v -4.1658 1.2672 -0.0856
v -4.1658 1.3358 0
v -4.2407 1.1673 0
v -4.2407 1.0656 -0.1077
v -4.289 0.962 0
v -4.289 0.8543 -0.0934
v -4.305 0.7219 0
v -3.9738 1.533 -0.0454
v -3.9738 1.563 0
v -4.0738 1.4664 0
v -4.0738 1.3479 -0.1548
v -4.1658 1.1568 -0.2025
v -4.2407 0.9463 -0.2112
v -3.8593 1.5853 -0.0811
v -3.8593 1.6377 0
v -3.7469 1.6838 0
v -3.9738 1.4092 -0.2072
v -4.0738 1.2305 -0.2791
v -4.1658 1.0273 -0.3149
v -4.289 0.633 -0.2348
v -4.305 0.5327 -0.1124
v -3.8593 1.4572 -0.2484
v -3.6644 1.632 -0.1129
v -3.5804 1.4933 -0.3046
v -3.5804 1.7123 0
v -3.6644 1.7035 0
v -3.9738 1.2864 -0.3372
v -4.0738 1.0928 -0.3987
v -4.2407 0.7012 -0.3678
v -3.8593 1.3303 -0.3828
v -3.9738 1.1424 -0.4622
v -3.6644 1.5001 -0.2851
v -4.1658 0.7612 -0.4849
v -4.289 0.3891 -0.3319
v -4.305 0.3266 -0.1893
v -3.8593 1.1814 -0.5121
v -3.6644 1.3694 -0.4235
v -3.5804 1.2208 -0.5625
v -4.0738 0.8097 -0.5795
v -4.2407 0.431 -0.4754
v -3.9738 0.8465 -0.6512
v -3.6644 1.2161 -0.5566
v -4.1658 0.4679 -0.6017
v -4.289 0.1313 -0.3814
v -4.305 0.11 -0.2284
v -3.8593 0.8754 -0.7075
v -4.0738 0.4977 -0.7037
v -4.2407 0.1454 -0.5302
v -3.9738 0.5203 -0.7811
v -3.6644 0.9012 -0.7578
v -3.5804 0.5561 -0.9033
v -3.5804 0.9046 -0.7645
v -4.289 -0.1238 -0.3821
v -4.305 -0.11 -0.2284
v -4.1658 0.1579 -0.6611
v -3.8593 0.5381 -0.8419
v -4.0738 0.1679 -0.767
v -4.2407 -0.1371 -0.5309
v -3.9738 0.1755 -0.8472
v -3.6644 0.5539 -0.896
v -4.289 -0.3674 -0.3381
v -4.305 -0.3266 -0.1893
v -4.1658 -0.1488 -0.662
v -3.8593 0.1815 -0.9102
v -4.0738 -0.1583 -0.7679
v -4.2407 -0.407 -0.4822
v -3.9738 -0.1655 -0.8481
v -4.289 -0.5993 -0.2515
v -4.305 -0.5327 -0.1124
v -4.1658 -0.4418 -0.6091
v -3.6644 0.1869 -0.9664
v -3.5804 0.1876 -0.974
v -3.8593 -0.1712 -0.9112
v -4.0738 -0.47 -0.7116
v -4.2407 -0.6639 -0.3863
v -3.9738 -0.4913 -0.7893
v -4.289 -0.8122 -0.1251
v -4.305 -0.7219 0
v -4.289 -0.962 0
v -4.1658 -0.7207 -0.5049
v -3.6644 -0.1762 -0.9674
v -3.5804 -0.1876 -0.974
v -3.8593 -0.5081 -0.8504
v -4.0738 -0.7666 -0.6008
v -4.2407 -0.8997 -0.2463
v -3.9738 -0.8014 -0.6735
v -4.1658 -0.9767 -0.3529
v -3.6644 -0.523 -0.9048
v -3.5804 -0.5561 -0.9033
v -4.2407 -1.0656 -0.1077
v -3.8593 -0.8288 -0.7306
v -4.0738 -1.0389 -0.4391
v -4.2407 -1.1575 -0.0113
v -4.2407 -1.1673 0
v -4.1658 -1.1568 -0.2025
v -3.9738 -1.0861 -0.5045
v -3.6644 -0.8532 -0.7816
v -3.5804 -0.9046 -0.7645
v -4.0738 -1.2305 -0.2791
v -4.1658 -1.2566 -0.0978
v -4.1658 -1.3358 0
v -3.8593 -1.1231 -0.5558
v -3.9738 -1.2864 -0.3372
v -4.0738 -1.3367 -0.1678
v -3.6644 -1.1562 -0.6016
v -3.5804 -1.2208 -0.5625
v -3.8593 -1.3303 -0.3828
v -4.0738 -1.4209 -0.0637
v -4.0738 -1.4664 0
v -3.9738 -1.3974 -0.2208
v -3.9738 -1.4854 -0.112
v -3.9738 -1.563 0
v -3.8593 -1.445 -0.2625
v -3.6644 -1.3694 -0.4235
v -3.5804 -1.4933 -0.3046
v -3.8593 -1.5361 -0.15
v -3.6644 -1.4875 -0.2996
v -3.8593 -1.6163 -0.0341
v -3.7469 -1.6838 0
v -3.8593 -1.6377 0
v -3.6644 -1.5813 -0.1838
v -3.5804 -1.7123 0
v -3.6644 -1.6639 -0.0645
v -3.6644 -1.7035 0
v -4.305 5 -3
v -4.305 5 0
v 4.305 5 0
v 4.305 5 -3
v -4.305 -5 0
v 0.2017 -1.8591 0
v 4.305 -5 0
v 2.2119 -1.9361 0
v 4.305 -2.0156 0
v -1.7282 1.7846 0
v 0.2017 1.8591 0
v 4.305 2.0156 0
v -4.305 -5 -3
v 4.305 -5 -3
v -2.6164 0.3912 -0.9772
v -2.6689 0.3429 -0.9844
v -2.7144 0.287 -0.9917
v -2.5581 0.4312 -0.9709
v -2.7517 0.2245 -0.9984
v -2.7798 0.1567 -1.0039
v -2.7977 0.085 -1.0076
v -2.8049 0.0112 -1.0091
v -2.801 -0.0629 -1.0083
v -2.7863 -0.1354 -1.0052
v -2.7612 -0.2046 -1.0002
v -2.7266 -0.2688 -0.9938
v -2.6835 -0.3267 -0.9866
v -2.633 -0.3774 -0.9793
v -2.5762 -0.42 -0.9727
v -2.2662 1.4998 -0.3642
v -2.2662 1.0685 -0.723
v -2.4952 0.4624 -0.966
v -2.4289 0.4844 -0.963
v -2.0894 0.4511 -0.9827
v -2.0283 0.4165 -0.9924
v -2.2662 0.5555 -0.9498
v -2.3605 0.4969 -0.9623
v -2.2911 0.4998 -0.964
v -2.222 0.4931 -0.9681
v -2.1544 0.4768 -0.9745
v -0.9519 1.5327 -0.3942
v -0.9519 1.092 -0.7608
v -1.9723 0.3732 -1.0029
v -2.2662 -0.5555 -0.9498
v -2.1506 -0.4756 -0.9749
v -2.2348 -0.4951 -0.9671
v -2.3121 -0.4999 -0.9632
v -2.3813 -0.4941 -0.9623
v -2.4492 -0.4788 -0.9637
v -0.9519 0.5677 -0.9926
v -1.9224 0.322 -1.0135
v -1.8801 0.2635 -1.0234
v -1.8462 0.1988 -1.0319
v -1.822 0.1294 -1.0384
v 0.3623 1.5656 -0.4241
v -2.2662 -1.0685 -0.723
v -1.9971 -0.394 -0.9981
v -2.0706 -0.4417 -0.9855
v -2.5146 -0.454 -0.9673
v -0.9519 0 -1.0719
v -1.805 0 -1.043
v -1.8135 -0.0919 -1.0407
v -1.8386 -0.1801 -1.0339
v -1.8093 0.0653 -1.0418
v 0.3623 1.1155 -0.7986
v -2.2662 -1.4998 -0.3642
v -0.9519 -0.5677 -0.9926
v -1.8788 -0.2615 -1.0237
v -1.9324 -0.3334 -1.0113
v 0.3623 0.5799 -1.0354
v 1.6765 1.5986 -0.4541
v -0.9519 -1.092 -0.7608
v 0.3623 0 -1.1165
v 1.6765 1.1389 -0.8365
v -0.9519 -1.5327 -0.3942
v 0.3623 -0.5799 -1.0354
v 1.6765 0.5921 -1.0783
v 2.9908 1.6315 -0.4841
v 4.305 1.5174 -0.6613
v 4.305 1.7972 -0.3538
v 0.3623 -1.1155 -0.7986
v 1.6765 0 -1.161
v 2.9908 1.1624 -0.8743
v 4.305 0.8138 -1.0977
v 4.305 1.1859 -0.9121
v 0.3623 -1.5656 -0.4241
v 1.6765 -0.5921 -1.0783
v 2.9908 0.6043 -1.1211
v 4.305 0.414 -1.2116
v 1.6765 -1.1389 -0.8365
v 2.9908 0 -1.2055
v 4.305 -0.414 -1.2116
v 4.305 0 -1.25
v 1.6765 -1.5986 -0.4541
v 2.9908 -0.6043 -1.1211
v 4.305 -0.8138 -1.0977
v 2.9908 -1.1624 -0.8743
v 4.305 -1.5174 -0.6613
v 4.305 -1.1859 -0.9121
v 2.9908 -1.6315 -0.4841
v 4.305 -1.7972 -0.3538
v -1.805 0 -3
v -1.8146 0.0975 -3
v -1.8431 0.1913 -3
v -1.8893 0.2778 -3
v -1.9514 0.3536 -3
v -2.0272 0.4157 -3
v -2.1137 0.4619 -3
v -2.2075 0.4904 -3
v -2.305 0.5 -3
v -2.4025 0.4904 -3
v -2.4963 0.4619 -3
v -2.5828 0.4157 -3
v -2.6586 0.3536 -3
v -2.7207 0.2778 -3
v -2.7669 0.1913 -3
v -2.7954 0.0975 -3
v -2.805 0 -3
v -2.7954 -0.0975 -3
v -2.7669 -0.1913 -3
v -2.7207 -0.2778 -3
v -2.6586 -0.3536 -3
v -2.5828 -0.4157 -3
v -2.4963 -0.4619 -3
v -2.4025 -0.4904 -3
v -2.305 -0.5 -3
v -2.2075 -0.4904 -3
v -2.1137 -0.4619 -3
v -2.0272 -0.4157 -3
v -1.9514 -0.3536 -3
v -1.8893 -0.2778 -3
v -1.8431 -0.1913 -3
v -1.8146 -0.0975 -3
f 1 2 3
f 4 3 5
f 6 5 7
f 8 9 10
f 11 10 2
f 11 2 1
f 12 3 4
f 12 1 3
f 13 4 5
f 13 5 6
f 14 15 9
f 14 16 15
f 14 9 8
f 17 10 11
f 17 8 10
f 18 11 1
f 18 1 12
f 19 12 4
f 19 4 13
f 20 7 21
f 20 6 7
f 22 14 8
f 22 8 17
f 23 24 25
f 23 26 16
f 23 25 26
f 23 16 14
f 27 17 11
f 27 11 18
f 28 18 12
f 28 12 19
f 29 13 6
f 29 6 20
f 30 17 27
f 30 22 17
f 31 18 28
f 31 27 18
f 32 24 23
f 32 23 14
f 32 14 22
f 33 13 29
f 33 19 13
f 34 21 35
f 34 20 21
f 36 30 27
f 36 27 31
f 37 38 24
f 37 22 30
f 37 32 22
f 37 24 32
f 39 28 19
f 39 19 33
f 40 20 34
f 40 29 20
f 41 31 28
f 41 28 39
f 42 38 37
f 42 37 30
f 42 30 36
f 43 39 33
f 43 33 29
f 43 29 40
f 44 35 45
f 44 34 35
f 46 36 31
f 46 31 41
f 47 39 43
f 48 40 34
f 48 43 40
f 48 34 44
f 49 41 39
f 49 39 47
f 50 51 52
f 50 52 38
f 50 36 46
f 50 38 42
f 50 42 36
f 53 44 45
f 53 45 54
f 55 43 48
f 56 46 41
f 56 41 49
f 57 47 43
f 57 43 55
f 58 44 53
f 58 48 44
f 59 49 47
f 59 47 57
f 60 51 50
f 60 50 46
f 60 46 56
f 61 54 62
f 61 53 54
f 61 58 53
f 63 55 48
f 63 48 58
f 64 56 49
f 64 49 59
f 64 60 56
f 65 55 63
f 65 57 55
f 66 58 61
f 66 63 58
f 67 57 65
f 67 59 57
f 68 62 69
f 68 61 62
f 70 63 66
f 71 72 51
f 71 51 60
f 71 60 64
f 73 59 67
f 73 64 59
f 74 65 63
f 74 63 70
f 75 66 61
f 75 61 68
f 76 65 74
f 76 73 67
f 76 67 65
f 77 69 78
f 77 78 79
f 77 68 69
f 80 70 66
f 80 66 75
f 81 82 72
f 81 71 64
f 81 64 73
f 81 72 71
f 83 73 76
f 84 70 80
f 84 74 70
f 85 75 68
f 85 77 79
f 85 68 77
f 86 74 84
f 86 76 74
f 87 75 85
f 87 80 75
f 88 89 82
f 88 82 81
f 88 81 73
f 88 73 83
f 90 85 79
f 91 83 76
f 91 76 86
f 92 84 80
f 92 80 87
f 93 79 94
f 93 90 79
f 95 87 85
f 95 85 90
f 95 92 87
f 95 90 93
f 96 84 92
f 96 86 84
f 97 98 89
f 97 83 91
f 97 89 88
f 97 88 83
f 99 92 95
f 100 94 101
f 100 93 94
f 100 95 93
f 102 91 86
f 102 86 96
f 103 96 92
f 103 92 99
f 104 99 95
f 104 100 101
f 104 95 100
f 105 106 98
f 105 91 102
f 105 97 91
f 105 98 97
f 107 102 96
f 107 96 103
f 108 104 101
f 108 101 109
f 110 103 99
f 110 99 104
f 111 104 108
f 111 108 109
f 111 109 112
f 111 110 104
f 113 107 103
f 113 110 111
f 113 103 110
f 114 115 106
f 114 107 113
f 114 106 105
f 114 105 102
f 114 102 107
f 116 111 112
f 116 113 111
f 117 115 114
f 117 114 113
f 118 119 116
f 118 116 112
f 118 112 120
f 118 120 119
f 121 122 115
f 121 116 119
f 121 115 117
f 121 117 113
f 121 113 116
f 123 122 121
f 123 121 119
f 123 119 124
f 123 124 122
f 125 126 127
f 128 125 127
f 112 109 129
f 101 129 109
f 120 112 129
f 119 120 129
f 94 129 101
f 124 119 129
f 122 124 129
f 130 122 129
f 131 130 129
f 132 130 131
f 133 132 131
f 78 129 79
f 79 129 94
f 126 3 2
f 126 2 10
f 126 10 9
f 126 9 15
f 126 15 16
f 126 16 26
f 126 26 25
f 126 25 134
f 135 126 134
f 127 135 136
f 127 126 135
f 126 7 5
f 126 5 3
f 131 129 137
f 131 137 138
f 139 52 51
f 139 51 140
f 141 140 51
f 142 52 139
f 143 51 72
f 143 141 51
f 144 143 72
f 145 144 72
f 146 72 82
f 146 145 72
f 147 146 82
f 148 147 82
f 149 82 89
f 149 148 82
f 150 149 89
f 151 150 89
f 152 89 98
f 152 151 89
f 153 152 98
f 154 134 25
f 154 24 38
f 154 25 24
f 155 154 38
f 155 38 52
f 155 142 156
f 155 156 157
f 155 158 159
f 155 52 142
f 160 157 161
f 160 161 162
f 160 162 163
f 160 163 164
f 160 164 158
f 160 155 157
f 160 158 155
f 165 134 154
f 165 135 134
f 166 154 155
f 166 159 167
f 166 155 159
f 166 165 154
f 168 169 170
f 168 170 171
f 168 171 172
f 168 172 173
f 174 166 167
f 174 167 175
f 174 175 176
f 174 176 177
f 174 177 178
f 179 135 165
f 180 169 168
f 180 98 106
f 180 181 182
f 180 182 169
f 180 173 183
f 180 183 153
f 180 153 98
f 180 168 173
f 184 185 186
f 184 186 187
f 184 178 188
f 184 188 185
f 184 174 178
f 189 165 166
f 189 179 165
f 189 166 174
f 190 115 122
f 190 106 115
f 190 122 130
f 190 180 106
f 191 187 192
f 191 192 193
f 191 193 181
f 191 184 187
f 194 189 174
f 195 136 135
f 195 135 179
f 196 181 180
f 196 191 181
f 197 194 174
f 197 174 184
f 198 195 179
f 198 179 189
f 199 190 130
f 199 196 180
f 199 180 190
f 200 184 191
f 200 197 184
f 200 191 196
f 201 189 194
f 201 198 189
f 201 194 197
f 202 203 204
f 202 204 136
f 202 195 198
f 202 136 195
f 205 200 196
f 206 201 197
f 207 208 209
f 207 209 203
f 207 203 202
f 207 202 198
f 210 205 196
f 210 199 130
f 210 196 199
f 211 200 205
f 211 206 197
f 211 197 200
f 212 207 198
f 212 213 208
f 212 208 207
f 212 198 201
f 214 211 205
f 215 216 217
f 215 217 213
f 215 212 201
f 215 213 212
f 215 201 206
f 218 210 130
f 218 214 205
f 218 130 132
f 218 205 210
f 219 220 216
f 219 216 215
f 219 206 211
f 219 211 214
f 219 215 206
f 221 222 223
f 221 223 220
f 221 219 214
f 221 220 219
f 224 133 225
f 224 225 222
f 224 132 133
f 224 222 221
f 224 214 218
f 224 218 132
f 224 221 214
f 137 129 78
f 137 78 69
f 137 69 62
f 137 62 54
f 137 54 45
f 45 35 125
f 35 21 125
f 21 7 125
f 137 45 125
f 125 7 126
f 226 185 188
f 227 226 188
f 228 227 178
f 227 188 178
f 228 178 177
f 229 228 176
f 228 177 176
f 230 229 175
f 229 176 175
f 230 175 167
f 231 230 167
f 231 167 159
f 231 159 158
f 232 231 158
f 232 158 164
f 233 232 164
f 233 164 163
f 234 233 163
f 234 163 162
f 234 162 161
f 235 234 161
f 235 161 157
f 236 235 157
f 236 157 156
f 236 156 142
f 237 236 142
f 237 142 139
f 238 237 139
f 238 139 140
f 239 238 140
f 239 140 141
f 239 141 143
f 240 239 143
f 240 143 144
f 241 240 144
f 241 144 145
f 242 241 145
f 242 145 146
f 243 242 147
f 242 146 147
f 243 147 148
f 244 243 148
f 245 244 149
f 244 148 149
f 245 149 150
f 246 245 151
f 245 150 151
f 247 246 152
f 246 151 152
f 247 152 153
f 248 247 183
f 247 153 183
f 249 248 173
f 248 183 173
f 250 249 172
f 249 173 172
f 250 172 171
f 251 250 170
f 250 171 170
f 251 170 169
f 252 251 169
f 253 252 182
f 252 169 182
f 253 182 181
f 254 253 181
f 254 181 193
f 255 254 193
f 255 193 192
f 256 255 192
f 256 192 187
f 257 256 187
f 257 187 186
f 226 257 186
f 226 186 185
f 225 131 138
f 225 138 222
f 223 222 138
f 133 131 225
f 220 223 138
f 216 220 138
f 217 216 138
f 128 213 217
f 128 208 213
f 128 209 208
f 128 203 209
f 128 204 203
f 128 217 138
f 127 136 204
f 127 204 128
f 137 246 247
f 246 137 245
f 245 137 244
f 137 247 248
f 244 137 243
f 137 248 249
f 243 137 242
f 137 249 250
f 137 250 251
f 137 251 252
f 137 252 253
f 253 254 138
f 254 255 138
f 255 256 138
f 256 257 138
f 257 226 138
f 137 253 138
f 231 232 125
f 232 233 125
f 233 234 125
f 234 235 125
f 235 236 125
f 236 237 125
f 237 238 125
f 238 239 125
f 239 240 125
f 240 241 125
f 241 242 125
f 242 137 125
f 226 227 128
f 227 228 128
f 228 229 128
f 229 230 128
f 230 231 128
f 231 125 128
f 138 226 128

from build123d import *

# Parameters (mm, degrees)
F0_W     = 8.61
F0_H     = 10
F1_DEPTH = 3
F4_R     = 0.5
F5_DEPTH = 25


with BuildPart() as f1:
    # F0 (on Top) → F1 (new body)
    with BuildSketch(Plane.XY):
        Rectangle(F0_W, F0_H)
    extrude(amount=-F1_DEPTH)

    # F2 (on Front) → F3 (revolve, cut)
    with BuildSketch(Plane.XZ):
        with BuildLine():
            ThreePointArc((-4.305, -0.233333), (-4.094232, -0.75461), (-3.58039, -0.982903))
            Line((-3.58039, -0.982903), (4.305, -1.25))
            Line((4.305, -1.25), (4.305, 1))
            Line((4.305, 1), (-4.305, 1))
            Line((-4.305, 1), (-4.305, -0.233333))
        make_face()
    revolve(axis=Axis((0, 0, 1), (-1, 0, 0)), mode=Mode.SUBTRACT)

    # F4 (on face) → F5 (cut)
    with BuildSketch(Plane.XY):
        with Locations((-2.305, 0)):
            Circle(F4_R)
    extrude(amount=-F5_DEPTH, mode=Mode.SUBTRACT)


solid = f1.part
